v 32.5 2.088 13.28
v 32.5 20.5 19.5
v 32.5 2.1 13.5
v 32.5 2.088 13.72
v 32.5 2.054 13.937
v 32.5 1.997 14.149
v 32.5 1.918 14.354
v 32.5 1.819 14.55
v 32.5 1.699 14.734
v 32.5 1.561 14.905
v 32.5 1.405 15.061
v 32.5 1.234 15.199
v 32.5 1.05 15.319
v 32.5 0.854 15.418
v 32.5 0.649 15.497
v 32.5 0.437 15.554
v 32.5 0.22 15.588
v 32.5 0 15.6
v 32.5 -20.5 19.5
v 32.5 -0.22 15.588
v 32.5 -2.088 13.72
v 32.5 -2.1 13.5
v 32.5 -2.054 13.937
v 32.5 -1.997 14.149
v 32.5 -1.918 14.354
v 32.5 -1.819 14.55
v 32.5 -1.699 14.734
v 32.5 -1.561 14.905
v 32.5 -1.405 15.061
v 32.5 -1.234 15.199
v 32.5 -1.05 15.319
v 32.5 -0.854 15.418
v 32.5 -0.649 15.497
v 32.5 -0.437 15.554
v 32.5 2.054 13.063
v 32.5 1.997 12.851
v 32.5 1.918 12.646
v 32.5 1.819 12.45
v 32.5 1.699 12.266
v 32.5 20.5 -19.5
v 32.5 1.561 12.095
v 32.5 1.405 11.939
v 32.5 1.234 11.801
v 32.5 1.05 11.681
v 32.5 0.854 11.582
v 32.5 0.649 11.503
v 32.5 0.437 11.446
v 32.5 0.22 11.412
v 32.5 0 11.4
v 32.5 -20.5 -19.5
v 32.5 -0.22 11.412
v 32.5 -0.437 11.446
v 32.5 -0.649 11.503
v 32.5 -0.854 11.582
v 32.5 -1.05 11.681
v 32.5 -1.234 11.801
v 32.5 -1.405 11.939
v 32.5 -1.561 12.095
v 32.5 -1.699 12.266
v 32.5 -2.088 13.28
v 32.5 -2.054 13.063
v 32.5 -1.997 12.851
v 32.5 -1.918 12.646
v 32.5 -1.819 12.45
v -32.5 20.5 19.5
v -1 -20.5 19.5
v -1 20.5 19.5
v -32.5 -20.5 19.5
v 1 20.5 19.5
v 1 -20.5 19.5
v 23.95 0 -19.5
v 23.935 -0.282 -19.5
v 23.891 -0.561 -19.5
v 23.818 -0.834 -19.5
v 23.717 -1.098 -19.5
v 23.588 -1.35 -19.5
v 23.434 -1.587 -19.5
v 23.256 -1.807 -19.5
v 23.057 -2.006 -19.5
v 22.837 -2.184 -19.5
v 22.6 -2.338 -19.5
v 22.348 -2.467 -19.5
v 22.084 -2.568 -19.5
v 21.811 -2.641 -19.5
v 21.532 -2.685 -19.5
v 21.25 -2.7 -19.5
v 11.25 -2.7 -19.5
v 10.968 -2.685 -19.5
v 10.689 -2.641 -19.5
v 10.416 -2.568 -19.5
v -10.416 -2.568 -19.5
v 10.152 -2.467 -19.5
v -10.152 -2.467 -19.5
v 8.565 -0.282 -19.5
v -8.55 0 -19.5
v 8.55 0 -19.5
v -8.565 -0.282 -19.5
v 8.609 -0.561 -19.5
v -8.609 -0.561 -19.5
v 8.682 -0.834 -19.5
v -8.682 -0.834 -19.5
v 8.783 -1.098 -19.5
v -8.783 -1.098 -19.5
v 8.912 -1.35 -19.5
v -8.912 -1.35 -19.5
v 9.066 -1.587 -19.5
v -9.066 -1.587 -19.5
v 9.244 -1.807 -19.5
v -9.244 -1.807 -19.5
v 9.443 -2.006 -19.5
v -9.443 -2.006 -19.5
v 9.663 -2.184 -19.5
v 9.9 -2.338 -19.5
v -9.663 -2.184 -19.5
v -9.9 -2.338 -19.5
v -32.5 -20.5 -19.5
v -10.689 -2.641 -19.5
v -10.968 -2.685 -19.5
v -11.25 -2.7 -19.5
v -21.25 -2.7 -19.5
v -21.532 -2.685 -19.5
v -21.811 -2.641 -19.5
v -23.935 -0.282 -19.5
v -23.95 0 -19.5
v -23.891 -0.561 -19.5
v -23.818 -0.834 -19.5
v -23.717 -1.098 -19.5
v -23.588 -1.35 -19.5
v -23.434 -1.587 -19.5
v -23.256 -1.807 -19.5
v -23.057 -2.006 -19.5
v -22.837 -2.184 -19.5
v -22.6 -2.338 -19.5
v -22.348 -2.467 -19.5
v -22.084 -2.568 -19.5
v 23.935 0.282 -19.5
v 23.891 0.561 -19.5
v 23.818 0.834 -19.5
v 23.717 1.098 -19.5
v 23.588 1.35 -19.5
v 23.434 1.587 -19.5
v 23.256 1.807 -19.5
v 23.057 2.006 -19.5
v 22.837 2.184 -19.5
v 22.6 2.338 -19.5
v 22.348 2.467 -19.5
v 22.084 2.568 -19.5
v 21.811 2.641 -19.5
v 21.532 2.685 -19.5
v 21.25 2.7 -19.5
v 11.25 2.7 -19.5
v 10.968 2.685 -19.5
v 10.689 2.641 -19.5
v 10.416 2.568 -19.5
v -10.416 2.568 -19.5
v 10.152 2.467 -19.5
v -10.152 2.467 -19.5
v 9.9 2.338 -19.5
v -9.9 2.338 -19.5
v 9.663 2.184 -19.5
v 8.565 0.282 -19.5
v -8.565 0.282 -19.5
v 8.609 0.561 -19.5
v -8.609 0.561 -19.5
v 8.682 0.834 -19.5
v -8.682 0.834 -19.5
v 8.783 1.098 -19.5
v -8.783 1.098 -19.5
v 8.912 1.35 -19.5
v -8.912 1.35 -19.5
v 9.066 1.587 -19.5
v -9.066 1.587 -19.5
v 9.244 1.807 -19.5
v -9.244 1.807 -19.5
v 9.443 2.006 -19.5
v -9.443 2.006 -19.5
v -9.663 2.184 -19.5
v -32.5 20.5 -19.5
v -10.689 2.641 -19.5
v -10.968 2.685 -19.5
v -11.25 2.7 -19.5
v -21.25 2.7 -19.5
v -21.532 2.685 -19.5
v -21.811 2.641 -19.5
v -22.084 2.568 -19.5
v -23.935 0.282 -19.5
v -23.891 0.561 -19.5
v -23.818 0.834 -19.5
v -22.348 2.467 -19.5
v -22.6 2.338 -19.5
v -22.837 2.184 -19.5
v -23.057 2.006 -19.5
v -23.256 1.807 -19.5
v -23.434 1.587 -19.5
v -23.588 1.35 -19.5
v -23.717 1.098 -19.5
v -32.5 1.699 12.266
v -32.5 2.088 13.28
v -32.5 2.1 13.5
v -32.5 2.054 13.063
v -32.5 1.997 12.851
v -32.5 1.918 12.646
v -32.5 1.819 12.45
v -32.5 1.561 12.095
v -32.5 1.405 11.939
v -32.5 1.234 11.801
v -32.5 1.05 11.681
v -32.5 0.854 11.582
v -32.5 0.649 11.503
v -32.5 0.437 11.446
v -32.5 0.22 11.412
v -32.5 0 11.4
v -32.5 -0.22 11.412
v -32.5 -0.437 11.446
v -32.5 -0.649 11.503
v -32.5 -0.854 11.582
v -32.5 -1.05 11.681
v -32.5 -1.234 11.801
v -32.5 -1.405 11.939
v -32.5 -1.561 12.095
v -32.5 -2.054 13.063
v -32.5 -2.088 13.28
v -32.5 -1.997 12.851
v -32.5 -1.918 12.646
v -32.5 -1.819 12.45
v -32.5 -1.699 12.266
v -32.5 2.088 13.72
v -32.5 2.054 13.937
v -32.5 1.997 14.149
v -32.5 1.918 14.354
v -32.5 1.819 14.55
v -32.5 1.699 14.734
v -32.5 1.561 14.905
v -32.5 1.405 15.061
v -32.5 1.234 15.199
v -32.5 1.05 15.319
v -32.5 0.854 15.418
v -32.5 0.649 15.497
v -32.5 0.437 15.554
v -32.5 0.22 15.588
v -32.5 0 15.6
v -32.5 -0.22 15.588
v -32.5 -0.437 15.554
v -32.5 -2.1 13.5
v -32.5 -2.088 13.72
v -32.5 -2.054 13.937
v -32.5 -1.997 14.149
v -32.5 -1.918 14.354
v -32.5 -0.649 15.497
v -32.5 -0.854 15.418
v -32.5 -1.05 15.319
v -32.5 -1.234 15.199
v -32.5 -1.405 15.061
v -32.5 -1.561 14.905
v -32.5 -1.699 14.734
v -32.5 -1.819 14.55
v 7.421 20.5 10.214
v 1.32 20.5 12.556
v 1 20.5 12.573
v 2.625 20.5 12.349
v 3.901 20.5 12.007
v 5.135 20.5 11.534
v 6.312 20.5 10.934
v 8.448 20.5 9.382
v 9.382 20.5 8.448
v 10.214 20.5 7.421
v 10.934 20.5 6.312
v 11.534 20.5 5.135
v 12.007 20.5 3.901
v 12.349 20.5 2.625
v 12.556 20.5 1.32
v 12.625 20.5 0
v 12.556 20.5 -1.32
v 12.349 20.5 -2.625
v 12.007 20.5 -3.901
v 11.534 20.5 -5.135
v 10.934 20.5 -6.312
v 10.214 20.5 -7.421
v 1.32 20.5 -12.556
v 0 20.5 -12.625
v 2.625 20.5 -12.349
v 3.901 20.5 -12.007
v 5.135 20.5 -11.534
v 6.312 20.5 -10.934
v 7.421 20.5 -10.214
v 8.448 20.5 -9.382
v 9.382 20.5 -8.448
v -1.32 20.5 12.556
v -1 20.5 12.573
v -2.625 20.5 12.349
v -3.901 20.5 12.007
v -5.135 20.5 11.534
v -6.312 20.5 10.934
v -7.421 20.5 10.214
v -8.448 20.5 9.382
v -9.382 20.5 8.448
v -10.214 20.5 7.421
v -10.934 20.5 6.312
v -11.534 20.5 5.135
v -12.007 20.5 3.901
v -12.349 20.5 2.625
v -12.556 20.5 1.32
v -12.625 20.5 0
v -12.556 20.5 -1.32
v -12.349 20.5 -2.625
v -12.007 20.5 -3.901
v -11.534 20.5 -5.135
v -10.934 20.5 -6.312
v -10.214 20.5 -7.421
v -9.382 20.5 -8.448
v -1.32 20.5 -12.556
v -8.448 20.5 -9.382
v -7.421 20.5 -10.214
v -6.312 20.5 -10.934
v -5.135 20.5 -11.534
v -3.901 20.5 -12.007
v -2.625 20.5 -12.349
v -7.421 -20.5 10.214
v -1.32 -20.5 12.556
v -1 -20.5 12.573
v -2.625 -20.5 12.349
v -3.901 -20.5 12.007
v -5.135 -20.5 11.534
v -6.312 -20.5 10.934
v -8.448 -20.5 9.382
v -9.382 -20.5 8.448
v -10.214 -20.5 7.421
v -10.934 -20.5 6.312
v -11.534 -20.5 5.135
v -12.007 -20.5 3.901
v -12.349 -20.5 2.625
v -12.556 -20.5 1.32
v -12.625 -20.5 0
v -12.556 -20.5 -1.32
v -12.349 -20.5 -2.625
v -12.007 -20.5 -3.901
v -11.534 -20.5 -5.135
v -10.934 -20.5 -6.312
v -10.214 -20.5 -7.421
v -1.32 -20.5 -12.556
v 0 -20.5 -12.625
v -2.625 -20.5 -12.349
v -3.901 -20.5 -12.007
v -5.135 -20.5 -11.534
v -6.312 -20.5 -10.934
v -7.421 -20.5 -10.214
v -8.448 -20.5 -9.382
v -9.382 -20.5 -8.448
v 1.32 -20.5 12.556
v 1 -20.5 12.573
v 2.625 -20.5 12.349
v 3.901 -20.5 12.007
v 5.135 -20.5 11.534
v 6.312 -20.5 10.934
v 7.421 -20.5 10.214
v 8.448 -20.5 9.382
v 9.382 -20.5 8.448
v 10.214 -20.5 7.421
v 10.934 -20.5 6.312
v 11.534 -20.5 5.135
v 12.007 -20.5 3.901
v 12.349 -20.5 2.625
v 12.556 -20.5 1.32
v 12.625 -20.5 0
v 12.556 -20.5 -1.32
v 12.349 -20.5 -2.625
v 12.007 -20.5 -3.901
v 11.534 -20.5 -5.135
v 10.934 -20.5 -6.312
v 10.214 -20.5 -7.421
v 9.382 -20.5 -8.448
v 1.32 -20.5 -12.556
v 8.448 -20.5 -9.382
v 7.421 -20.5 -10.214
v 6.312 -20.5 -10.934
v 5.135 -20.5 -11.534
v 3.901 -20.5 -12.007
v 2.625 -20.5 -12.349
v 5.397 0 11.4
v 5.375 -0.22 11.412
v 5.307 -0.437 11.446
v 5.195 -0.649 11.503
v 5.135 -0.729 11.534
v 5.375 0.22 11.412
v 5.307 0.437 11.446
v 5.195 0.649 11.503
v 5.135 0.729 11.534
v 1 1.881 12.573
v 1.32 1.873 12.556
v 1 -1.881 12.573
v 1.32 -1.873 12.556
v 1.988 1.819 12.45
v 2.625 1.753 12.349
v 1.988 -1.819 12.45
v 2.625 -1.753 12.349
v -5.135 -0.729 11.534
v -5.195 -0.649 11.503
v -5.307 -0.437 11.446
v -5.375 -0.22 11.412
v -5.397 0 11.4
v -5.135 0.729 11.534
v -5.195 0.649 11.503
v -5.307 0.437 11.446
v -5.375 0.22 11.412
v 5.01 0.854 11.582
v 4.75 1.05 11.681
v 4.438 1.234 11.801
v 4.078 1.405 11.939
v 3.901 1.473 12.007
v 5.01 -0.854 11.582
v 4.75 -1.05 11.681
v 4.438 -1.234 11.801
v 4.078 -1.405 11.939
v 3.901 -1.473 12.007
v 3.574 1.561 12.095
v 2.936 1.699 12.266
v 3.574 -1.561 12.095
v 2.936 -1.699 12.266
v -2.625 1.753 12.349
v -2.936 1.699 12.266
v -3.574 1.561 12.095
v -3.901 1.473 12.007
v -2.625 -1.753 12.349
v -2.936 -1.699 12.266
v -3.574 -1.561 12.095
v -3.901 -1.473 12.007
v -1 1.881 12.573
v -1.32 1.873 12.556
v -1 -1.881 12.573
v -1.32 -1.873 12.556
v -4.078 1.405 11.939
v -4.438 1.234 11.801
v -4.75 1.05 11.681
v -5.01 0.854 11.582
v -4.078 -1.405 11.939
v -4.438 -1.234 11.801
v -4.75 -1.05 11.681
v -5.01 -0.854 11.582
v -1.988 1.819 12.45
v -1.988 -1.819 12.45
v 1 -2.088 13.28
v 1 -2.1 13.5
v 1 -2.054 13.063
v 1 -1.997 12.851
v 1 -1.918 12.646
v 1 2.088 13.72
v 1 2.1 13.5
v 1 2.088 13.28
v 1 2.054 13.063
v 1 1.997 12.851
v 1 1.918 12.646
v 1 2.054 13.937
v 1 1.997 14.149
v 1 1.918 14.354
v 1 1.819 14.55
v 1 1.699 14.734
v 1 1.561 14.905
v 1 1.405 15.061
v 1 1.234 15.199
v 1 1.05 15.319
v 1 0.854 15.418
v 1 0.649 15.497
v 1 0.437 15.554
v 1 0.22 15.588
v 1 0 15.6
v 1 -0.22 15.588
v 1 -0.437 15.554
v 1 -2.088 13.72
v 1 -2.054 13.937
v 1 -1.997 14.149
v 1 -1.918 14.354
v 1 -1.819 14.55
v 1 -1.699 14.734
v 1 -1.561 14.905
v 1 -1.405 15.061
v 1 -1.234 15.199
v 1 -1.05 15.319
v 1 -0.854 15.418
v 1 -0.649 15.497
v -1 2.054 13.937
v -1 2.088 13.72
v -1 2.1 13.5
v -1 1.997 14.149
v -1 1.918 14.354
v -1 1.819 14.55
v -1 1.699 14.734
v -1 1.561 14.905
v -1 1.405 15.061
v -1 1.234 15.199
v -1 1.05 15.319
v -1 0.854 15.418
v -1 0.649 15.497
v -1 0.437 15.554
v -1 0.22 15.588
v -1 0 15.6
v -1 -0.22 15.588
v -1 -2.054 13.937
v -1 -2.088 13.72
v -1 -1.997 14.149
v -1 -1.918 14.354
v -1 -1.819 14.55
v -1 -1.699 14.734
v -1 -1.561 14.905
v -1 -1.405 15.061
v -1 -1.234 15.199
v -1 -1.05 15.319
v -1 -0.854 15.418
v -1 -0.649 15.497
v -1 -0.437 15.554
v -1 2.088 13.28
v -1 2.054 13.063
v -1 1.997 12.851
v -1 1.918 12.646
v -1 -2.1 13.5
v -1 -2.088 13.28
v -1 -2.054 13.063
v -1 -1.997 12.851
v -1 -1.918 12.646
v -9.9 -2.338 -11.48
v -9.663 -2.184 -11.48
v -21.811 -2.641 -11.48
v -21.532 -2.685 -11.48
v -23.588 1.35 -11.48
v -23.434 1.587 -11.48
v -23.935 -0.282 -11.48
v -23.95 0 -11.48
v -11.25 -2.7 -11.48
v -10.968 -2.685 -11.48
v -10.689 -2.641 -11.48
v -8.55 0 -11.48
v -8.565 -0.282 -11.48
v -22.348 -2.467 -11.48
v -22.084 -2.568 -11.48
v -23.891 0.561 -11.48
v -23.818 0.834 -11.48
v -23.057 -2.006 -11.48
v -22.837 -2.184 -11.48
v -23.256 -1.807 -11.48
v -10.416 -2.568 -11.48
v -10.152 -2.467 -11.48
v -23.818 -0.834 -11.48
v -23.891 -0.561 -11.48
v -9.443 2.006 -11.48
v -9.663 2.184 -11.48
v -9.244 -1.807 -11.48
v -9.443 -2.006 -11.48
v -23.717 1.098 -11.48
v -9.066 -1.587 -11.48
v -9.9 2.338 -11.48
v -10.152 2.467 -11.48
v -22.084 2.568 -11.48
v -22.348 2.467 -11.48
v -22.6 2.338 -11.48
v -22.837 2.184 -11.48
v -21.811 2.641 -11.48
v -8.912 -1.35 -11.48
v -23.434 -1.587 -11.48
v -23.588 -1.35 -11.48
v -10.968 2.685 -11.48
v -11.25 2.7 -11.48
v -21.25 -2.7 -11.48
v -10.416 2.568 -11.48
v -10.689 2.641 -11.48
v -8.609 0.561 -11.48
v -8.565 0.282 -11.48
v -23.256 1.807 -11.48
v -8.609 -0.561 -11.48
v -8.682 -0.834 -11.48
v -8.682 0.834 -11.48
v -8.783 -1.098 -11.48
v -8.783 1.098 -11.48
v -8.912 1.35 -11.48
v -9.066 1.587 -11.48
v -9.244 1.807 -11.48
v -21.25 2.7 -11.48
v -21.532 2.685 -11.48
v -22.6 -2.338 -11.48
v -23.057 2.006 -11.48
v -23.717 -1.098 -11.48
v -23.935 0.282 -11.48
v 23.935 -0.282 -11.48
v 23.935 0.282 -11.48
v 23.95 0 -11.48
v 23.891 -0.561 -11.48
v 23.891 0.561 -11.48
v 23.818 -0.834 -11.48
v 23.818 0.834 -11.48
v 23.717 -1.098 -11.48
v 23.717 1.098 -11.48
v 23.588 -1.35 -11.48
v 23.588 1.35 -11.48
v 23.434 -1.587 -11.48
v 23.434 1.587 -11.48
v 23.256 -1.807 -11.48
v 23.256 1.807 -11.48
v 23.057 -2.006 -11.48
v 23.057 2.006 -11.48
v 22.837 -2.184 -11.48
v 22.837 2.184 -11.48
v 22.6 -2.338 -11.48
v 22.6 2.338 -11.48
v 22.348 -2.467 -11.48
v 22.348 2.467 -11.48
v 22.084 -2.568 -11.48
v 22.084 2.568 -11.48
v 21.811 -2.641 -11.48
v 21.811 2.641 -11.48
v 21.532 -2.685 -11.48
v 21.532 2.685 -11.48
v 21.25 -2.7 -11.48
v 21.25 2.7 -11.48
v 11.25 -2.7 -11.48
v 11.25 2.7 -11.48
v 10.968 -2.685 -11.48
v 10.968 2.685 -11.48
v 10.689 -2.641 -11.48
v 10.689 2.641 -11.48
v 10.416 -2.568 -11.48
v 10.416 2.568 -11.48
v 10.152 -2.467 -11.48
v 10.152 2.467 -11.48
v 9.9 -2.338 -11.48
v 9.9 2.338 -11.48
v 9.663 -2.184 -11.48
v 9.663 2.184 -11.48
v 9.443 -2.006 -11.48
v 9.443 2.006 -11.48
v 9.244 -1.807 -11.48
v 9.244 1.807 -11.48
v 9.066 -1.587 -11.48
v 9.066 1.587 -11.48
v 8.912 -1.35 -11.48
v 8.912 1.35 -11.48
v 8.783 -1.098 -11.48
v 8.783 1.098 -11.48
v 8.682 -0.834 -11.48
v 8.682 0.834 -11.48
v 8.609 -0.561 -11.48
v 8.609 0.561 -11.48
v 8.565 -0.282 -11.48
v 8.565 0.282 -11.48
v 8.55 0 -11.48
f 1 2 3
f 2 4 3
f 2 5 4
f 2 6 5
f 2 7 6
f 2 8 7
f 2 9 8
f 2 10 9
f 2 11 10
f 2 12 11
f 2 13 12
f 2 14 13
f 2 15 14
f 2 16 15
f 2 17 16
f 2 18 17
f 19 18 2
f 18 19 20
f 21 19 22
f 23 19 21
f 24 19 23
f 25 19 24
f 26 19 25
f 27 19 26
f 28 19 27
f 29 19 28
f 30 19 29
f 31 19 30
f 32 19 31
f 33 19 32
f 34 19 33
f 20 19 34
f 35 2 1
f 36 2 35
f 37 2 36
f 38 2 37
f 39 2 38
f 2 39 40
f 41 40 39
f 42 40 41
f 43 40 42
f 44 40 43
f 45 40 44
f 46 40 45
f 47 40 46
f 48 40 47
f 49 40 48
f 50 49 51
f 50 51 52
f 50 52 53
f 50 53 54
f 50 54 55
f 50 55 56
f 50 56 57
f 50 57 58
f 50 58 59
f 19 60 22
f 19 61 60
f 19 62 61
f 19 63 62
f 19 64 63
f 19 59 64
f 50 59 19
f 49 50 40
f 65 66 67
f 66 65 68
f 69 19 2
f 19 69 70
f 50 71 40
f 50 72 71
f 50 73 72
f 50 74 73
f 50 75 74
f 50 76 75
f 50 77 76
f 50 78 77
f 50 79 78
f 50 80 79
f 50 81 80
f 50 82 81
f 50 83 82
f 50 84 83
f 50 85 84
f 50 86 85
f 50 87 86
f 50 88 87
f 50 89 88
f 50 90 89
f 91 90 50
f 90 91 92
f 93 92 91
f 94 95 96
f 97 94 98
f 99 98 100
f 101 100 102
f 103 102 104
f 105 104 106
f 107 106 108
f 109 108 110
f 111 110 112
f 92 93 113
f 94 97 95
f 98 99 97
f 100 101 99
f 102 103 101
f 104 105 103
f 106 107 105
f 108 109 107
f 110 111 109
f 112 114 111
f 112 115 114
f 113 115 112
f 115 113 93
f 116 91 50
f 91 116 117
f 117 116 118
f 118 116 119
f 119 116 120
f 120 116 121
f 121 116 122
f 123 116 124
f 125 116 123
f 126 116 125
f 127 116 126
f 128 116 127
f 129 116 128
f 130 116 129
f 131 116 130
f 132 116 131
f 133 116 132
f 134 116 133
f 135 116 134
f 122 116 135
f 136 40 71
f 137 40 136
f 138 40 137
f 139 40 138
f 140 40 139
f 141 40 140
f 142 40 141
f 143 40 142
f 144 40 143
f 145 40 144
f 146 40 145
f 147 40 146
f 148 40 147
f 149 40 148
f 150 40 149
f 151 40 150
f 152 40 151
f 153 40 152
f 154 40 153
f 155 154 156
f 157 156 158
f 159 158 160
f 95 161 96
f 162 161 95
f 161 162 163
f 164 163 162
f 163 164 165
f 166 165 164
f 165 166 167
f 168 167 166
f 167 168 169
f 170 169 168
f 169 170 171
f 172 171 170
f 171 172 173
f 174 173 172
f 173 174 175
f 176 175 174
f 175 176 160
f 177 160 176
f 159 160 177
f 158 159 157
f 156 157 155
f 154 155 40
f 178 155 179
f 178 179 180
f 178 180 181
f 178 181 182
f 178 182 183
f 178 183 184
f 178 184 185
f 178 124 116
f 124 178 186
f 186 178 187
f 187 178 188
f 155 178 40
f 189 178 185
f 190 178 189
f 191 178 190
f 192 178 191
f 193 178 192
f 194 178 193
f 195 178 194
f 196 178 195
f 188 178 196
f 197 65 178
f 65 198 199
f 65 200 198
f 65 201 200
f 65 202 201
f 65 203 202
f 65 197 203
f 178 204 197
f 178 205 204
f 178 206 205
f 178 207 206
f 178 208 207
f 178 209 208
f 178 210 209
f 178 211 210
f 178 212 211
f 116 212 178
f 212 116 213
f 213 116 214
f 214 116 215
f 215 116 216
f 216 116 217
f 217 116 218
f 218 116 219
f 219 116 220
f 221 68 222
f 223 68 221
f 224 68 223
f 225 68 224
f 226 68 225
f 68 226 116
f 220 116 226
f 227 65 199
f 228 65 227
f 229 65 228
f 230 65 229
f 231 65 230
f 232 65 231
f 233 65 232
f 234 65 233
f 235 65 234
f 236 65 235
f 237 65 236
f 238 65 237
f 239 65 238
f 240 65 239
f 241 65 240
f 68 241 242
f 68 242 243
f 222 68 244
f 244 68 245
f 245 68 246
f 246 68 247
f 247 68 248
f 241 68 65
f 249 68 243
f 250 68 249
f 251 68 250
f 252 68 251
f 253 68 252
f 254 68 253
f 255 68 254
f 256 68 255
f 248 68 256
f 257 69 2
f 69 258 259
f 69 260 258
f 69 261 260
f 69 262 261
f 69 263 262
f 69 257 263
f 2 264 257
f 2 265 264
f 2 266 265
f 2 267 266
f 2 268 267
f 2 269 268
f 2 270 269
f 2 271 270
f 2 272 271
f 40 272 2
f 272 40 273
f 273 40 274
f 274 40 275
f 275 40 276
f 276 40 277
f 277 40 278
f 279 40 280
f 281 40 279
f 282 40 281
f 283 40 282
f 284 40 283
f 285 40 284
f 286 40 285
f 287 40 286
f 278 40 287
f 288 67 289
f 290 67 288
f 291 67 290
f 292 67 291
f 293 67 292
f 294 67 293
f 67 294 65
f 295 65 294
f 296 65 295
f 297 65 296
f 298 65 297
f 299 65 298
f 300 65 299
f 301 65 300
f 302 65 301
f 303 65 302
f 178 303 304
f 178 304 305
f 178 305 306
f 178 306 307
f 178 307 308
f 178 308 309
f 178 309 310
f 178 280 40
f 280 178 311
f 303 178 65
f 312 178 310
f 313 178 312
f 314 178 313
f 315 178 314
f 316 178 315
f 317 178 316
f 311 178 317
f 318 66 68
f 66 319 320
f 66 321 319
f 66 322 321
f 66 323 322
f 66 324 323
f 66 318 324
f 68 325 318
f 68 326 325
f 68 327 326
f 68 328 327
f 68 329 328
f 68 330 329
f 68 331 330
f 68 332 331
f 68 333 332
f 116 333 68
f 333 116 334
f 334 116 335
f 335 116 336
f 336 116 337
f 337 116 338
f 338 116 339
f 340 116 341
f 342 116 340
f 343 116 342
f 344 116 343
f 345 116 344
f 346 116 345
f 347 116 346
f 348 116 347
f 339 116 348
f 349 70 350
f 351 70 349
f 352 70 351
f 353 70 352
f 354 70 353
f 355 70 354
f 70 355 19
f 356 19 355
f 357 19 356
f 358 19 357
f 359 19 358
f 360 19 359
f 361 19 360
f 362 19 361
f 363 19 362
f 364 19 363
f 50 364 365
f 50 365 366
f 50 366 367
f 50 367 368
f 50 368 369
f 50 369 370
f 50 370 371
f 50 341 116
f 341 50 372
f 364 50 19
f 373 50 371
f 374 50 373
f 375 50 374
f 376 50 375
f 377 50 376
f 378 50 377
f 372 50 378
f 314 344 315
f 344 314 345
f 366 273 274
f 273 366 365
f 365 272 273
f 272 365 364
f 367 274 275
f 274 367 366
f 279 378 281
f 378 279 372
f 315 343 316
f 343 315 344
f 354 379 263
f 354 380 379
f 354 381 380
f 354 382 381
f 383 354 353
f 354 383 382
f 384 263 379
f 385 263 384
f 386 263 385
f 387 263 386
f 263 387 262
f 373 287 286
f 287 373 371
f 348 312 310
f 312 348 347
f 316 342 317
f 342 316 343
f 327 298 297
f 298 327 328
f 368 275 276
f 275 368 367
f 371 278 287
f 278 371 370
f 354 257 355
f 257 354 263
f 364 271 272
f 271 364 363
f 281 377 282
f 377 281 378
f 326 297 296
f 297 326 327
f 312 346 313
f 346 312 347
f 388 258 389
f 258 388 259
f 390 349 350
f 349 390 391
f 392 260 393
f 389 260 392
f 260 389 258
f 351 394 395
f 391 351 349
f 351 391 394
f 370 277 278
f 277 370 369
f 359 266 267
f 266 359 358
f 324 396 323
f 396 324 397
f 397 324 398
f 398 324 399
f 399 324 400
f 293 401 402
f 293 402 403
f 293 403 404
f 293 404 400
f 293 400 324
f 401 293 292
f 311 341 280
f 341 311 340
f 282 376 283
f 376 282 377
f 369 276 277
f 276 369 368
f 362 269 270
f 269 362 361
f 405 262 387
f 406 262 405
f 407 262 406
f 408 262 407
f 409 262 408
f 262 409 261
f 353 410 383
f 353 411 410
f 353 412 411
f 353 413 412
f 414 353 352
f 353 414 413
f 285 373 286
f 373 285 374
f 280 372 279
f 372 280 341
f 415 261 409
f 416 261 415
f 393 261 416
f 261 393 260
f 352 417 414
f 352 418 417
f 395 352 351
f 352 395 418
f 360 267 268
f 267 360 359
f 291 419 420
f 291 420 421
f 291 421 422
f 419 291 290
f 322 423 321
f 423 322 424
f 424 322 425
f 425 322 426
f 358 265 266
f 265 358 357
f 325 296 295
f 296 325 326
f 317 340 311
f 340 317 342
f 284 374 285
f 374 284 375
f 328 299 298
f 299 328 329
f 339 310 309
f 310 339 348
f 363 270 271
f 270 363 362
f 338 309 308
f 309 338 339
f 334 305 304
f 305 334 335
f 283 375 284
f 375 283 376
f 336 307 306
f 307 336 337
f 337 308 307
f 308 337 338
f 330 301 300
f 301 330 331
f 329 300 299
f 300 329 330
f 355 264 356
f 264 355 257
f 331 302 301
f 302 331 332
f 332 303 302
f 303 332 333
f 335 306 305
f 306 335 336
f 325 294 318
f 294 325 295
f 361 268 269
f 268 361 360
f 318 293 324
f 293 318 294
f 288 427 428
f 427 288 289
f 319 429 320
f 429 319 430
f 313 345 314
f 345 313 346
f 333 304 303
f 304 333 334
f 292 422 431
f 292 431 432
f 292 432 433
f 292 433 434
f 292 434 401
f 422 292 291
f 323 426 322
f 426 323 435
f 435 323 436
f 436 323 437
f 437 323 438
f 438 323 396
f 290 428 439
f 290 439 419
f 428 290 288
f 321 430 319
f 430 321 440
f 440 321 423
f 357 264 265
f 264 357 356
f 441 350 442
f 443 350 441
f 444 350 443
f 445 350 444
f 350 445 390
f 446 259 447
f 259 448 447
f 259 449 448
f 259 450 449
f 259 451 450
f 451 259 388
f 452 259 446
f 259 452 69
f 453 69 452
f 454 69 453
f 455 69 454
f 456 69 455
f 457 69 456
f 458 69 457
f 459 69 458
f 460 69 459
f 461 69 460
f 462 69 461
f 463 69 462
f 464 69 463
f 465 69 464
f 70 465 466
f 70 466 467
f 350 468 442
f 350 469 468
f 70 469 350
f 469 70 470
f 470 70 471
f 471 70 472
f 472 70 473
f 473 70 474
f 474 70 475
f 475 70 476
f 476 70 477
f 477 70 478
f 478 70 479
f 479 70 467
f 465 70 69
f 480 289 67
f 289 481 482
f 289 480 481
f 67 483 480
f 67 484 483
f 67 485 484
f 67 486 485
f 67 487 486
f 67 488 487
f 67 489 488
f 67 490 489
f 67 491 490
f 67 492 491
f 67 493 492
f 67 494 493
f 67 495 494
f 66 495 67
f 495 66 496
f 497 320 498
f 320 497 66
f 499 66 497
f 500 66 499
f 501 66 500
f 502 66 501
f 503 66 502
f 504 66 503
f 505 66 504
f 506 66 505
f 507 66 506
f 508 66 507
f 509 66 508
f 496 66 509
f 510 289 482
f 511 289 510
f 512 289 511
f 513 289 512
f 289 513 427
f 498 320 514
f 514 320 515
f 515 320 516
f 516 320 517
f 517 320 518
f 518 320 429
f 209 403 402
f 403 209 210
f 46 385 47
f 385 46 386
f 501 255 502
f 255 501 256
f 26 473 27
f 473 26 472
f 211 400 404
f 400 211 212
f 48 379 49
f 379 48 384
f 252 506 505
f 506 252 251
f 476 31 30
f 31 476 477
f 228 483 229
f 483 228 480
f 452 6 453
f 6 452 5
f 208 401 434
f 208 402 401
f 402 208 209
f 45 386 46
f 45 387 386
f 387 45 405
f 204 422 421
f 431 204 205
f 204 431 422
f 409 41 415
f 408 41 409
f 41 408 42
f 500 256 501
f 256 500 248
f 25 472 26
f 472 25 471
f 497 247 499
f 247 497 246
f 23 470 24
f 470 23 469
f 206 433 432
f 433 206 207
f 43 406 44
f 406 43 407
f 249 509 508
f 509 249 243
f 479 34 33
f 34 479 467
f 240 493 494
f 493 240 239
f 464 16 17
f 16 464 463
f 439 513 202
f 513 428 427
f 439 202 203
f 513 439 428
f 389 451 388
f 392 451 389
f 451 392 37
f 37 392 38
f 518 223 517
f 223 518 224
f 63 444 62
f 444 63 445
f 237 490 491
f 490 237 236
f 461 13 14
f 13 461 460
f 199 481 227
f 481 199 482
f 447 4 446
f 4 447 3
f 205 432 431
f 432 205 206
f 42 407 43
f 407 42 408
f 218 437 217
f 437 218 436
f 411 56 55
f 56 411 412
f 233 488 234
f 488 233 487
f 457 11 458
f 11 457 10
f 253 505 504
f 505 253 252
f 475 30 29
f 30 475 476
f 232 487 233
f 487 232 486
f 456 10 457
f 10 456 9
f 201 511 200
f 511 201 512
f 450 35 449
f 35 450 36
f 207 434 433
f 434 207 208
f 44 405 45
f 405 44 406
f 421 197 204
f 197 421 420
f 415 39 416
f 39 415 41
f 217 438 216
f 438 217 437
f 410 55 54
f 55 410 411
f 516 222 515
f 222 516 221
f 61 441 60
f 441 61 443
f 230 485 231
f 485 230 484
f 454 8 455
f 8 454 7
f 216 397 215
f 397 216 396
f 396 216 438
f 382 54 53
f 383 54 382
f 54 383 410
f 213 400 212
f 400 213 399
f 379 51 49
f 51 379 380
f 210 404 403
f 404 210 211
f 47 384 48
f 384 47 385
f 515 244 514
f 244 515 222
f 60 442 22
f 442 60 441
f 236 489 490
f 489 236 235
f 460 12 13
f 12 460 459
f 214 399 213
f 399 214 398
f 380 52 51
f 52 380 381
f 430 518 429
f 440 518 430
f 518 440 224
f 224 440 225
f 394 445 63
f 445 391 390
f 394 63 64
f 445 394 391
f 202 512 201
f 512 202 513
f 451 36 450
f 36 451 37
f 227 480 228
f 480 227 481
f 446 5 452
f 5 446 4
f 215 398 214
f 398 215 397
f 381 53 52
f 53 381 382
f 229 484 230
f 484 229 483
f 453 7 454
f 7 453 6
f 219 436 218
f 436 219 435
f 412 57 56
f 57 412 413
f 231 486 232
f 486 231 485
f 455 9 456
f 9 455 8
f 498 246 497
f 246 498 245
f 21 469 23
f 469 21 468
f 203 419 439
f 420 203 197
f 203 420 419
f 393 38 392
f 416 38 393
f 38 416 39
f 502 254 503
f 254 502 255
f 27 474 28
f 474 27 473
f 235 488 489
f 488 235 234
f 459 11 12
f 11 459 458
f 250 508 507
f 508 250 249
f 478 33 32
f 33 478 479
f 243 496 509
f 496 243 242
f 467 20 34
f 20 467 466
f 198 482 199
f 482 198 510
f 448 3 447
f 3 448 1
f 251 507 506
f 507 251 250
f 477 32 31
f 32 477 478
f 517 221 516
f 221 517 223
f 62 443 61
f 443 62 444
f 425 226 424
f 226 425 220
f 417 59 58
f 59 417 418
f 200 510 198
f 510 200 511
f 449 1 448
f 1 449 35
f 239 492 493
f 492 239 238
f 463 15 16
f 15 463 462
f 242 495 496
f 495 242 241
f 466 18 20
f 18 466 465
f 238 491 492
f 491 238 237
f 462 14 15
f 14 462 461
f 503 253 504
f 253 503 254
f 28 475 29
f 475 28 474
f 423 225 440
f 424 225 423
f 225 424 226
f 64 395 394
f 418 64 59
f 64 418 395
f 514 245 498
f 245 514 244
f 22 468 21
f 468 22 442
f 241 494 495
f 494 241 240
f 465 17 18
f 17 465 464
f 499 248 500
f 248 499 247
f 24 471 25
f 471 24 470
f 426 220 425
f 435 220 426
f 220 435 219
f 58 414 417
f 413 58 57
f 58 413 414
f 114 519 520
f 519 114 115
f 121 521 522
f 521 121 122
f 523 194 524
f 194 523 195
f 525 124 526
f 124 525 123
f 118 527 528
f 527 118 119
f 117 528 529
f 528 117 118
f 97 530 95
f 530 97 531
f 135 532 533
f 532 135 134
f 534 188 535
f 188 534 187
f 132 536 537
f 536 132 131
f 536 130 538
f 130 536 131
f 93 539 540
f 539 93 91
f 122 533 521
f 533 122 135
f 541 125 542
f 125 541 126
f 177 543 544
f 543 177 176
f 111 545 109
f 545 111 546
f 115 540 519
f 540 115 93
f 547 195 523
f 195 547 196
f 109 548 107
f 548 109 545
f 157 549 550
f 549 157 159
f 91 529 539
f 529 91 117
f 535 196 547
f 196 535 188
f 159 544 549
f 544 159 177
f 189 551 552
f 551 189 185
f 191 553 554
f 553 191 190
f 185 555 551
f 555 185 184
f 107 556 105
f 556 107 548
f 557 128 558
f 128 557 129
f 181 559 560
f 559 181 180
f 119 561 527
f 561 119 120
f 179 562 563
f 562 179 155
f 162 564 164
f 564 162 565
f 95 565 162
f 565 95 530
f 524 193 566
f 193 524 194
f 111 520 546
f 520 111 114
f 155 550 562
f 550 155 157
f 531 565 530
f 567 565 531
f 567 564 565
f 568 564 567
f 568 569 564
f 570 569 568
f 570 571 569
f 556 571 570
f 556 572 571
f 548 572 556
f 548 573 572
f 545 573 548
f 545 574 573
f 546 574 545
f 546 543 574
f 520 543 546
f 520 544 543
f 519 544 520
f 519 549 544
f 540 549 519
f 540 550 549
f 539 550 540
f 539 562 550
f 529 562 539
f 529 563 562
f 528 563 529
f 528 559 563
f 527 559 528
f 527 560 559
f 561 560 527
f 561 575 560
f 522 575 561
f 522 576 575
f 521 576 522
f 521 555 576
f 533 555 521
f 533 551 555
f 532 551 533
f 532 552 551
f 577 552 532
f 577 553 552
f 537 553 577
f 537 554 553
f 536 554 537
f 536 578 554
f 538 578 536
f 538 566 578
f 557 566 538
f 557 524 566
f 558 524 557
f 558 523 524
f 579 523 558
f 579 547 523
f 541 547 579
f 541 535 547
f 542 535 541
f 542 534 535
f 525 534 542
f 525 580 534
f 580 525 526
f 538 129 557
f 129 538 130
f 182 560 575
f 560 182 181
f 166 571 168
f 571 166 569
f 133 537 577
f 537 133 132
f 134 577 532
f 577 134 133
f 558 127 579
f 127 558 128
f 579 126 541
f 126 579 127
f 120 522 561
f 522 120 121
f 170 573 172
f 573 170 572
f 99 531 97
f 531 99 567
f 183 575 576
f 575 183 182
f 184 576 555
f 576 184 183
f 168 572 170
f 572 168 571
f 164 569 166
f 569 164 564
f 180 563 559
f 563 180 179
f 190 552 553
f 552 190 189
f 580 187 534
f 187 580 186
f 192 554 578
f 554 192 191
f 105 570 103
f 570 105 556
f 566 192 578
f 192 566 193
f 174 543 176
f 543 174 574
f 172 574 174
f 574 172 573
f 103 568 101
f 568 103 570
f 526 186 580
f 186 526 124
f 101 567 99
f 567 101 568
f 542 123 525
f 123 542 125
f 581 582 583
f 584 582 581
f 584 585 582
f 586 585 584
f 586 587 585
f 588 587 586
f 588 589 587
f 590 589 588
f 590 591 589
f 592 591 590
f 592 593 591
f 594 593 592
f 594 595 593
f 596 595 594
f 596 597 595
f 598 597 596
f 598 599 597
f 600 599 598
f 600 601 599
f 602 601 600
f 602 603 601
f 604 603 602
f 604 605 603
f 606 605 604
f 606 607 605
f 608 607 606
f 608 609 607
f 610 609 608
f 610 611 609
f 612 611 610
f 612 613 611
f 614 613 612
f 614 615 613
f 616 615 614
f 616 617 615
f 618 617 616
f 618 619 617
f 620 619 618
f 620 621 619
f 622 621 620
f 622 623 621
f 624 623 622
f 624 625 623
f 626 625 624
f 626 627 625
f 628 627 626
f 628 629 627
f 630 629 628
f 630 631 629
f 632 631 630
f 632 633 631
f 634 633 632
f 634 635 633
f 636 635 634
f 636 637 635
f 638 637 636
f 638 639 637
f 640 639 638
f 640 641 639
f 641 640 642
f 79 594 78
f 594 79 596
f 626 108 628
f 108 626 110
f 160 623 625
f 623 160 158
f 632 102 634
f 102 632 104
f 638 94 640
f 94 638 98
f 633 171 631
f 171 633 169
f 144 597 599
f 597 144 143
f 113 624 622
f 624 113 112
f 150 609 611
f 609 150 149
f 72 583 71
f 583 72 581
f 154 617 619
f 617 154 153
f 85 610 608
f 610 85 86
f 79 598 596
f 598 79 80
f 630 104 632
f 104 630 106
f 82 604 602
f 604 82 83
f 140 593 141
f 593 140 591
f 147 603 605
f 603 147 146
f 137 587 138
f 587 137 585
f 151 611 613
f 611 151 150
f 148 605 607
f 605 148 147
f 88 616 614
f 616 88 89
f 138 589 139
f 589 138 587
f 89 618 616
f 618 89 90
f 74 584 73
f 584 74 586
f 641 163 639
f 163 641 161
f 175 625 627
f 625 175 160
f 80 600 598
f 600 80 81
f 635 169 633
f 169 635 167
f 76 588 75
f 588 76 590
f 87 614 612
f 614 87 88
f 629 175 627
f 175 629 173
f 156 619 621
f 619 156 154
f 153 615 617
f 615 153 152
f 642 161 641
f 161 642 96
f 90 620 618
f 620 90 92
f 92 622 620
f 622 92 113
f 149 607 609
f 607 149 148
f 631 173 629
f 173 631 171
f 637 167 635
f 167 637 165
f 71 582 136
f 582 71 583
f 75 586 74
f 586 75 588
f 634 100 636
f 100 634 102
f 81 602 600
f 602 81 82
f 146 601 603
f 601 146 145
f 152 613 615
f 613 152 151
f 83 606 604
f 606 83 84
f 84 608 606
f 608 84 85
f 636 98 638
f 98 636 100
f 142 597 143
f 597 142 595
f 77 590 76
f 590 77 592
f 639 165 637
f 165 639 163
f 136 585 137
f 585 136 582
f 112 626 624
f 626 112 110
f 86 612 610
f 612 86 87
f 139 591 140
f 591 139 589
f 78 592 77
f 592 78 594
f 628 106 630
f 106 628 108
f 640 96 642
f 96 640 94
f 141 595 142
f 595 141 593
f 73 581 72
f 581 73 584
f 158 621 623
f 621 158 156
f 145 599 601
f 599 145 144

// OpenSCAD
// Split housing for 25 mm OD linear bearing.
$fn = 60;
eps = 0.02;
bearing_d = 25;
body_l = 65;
body_d = 41;
body_h = 39;
slot_w = 2;
module mount_slot(x) {
    hull() {
        translate([x - 5, 0, -body_h / 2 - eps]) cylinder(d = 5.4, h = 8 + 2 * eps);
        translate([x + 5, 0, -body_h / 2 - eps]) cylinder(d = 5.4, h = 8 + 2 * eps);
    }
}
difference() {
    cube([body_l, body_d, body_h], center = true);
    translate([0, -body_d / 2 - eps, 0]) rotate([-90, 0, 0]) cylinder(d = bearing_d + 0.25, h = body_d + 2 * eps);
    translate([-slot_w / 2, -body_d / 2 - eps, 0]) cube([slot_w, body_d + 2 * eps, body_h / 2 + eps]);
    translate([-body_l / 2 - eps, 0, body_h / 2 - 6]) rotate([0, 90, 0]) cylinder(d = 4.2, h = body_l + 2 * eps);
    mount_slot(-body_l / 4);
    mount_slot(body_l / 4);
}
